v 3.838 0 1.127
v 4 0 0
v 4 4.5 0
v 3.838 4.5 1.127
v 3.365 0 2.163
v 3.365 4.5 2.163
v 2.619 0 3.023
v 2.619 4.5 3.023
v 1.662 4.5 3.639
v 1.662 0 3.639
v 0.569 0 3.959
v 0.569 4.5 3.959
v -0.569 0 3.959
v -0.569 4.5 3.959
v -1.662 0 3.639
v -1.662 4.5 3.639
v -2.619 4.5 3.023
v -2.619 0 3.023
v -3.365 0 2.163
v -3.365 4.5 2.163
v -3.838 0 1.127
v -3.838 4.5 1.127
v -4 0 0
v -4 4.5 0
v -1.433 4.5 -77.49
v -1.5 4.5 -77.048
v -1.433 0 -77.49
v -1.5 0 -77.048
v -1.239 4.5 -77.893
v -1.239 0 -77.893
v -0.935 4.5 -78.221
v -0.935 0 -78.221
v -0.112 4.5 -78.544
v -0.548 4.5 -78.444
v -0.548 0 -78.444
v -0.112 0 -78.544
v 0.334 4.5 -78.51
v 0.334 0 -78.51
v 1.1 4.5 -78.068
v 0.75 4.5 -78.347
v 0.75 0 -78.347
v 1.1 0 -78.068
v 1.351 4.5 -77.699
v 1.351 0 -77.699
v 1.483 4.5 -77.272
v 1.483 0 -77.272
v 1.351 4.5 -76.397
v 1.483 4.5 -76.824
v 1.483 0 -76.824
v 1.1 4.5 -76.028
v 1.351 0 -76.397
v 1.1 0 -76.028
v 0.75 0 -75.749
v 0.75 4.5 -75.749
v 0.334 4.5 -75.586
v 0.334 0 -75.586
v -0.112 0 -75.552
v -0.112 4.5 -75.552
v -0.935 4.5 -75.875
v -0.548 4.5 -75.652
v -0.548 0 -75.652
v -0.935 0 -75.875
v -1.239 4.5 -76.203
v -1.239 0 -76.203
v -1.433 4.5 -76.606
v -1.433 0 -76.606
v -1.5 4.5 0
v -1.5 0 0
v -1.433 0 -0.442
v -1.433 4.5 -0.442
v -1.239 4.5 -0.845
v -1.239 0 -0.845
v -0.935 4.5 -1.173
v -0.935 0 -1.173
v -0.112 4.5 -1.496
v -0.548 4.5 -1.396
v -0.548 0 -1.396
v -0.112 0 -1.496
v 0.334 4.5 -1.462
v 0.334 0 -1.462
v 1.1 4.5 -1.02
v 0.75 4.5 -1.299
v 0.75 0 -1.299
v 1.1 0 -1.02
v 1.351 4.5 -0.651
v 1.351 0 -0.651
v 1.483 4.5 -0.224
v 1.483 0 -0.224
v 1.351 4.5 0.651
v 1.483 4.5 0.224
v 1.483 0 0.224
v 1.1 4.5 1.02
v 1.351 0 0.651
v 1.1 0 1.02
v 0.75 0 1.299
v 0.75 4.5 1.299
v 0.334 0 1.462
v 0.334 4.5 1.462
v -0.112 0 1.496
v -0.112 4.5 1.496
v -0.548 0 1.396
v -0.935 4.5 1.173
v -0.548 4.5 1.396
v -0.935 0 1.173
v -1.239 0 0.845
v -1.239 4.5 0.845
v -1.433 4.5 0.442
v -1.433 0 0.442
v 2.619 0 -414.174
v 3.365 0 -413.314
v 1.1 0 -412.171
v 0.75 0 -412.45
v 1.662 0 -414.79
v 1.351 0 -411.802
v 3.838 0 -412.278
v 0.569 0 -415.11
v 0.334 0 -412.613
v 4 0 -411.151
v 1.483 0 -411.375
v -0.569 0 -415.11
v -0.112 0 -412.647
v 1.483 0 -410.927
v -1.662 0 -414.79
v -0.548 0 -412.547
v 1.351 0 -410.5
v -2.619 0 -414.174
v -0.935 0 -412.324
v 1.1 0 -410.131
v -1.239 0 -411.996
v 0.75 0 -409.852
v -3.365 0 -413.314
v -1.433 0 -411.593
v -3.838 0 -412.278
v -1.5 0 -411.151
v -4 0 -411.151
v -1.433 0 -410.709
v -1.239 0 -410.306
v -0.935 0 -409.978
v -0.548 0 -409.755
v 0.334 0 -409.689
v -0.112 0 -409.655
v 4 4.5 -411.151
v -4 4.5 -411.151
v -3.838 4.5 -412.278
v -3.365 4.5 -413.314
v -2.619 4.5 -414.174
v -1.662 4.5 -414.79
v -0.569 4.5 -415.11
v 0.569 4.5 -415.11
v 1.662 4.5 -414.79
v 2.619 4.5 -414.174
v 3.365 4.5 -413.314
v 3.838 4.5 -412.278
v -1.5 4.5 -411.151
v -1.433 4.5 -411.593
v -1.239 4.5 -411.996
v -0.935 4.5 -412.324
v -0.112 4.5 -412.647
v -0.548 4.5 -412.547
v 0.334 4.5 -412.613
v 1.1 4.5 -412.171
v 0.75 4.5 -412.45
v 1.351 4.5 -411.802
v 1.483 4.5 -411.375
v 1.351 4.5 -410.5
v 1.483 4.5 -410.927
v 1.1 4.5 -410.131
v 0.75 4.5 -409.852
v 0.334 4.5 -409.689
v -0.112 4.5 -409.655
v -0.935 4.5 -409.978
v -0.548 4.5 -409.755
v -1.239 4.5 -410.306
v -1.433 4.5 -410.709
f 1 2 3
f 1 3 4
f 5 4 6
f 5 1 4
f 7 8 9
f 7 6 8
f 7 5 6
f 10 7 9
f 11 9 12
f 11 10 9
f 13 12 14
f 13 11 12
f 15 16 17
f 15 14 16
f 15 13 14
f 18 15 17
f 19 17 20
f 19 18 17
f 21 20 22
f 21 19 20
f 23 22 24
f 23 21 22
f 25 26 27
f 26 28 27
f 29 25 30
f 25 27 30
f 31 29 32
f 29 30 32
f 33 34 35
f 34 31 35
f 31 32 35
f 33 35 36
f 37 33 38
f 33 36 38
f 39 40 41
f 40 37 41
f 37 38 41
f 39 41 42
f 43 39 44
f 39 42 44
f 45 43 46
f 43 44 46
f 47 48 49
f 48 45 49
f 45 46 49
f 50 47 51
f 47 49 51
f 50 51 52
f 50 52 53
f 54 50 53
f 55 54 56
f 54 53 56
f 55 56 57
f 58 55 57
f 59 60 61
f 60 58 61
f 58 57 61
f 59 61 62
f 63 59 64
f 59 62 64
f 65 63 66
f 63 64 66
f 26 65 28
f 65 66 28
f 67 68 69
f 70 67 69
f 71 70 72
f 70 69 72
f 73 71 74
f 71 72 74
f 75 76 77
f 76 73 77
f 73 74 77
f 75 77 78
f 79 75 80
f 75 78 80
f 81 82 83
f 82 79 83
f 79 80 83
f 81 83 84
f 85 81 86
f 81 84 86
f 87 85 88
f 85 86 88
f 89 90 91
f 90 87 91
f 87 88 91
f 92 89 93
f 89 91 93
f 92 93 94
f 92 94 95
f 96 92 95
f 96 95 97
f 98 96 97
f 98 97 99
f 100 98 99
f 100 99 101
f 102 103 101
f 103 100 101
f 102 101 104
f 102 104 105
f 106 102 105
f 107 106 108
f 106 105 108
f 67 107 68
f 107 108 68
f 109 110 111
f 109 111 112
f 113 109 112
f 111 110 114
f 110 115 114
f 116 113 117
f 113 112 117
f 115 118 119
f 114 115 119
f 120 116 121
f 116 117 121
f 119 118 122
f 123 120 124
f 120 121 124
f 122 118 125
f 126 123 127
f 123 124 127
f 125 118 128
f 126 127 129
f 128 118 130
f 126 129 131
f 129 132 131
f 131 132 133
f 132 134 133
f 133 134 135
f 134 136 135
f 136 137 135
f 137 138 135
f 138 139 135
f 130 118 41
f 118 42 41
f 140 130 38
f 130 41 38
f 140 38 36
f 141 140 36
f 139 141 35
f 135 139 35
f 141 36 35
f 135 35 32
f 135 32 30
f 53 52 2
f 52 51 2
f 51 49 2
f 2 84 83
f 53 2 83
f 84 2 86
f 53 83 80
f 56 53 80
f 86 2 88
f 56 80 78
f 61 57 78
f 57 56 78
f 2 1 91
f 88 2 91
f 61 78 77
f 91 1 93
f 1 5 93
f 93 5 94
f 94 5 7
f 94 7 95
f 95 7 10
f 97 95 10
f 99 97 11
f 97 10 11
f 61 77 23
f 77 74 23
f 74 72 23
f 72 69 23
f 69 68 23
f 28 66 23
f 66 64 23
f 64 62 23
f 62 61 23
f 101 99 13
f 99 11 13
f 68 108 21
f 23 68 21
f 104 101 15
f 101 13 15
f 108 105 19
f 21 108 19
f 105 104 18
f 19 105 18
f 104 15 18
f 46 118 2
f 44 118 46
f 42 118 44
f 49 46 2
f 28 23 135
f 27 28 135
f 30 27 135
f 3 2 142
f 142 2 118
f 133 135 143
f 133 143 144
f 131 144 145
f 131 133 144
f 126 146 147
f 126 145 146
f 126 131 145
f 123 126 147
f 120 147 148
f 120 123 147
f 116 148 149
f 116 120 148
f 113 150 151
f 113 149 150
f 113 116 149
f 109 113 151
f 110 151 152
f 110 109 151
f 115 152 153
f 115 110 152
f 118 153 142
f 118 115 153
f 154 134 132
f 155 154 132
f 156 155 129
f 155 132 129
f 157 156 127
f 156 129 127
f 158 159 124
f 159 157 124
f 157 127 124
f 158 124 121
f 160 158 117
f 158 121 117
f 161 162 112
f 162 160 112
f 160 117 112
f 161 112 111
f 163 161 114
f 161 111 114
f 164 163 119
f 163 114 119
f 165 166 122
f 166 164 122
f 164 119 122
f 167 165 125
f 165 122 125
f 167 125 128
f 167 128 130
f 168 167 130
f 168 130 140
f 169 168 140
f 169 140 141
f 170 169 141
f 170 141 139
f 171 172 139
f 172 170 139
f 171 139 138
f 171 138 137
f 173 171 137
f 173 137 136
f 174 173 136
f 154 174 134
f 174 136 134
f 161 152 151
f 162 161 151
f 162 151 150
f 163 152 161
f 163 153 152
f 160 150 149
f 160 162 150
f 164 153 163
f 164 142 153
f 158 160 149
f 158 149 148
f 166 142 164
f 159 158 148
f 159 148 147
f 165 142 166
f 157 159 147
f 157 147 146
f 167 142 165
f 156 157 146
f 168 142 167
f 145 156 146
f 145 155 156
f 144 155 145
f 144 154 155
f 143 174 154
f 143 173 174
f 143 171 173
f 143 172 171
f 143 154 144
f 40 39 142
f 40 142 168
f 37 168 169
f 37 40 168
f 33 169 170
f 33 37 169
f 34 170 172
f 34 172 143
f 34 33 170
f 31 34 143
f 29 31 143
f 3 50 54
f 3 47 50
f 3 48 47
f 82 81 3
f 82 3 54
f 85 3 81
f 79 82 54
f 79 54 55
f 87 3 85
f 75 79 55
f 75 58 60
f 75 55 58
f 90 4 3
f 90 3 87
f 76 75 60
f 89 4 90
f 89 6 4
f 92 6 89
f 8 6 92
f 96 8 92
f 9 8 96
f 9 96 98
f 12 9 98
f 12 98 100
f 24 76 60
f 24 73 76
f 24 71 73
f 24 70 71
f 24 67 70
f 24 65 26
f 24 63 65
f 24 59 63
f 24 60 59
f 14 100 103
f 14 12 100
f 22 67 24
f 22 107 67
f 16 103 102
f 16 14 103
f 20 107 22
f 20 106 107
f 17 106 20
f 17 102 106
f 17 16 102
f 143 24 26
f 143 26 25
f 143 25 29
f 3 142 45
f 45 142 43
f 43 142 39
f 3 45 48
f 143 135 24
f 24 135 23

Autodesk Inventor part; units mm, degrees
ref_plane "YZ Plane" through (0, 0, 0) normal (1, 0, 0) x (0, 1, 0)
ref_plane "XZ Plane" through (0, 0, 0) normal (0, 1, 0) x (-1, 0, 0)
ref_plane "XY Plane" through (0, 0, 0) normal (0, 0, 1) x (1, 0, 0)
sketch "Sketch1" plane through (0, 0, 0) normal (0, 1, 0) x (-1, 0, 0)
  line L0 (0, 0) -> (0, -411.151) construction
  line L1 (-4, 0) -> (-4, -411.151)
  line L2 (4, -411.151) -> (4, 0)
  arc A0 (4, 0) -> (-4, 0) centre (0, 0) ccw
  arc A1 (-4, -411.151) -> (4, -411.151) centre (0, -411.151) ccw
  circle A2 centre (0, -411.151) radius 1.5
  circle A3 centre (0, 0) radius 1.5
  circle A4 centre (0, -77.048) radius 1.5
  point P0 (0, -205.5755)
  dimension "d0" = 411.151
  dimension "d1" = 8
  dimension "d2" = 3
  dimension "d3" = 3
  dimension "d6" = 3
  dimension "d7" = 334.103
extrude "Extrusion1" add sketch "Sketch1" along normal blind 4.5
sketch "Sketch2" plane through (0, 4.5, 0) normal (0, 1, 0) x (1, 0, 0)
  arc A0 (4, 411.151) -> (-4, 411.151) centre (0, 411.151) ccw projected
  line L0 (-4, 411.151) -> (-4, 0) projected
  arc A1 (-4, 0) -> (4, 0) centre (0, 0) ccw projected
  line L1 (4, 0) -> (4, 411.151) projected
  circle A2 centre (0, 77.048) radius 1.5 projected
  circle A3 centre (0, 0) radius 1.5 projected
  circle A4 centre (0, 411.151) radius 1.5 projected
properties part number "Wing_arm_2"
